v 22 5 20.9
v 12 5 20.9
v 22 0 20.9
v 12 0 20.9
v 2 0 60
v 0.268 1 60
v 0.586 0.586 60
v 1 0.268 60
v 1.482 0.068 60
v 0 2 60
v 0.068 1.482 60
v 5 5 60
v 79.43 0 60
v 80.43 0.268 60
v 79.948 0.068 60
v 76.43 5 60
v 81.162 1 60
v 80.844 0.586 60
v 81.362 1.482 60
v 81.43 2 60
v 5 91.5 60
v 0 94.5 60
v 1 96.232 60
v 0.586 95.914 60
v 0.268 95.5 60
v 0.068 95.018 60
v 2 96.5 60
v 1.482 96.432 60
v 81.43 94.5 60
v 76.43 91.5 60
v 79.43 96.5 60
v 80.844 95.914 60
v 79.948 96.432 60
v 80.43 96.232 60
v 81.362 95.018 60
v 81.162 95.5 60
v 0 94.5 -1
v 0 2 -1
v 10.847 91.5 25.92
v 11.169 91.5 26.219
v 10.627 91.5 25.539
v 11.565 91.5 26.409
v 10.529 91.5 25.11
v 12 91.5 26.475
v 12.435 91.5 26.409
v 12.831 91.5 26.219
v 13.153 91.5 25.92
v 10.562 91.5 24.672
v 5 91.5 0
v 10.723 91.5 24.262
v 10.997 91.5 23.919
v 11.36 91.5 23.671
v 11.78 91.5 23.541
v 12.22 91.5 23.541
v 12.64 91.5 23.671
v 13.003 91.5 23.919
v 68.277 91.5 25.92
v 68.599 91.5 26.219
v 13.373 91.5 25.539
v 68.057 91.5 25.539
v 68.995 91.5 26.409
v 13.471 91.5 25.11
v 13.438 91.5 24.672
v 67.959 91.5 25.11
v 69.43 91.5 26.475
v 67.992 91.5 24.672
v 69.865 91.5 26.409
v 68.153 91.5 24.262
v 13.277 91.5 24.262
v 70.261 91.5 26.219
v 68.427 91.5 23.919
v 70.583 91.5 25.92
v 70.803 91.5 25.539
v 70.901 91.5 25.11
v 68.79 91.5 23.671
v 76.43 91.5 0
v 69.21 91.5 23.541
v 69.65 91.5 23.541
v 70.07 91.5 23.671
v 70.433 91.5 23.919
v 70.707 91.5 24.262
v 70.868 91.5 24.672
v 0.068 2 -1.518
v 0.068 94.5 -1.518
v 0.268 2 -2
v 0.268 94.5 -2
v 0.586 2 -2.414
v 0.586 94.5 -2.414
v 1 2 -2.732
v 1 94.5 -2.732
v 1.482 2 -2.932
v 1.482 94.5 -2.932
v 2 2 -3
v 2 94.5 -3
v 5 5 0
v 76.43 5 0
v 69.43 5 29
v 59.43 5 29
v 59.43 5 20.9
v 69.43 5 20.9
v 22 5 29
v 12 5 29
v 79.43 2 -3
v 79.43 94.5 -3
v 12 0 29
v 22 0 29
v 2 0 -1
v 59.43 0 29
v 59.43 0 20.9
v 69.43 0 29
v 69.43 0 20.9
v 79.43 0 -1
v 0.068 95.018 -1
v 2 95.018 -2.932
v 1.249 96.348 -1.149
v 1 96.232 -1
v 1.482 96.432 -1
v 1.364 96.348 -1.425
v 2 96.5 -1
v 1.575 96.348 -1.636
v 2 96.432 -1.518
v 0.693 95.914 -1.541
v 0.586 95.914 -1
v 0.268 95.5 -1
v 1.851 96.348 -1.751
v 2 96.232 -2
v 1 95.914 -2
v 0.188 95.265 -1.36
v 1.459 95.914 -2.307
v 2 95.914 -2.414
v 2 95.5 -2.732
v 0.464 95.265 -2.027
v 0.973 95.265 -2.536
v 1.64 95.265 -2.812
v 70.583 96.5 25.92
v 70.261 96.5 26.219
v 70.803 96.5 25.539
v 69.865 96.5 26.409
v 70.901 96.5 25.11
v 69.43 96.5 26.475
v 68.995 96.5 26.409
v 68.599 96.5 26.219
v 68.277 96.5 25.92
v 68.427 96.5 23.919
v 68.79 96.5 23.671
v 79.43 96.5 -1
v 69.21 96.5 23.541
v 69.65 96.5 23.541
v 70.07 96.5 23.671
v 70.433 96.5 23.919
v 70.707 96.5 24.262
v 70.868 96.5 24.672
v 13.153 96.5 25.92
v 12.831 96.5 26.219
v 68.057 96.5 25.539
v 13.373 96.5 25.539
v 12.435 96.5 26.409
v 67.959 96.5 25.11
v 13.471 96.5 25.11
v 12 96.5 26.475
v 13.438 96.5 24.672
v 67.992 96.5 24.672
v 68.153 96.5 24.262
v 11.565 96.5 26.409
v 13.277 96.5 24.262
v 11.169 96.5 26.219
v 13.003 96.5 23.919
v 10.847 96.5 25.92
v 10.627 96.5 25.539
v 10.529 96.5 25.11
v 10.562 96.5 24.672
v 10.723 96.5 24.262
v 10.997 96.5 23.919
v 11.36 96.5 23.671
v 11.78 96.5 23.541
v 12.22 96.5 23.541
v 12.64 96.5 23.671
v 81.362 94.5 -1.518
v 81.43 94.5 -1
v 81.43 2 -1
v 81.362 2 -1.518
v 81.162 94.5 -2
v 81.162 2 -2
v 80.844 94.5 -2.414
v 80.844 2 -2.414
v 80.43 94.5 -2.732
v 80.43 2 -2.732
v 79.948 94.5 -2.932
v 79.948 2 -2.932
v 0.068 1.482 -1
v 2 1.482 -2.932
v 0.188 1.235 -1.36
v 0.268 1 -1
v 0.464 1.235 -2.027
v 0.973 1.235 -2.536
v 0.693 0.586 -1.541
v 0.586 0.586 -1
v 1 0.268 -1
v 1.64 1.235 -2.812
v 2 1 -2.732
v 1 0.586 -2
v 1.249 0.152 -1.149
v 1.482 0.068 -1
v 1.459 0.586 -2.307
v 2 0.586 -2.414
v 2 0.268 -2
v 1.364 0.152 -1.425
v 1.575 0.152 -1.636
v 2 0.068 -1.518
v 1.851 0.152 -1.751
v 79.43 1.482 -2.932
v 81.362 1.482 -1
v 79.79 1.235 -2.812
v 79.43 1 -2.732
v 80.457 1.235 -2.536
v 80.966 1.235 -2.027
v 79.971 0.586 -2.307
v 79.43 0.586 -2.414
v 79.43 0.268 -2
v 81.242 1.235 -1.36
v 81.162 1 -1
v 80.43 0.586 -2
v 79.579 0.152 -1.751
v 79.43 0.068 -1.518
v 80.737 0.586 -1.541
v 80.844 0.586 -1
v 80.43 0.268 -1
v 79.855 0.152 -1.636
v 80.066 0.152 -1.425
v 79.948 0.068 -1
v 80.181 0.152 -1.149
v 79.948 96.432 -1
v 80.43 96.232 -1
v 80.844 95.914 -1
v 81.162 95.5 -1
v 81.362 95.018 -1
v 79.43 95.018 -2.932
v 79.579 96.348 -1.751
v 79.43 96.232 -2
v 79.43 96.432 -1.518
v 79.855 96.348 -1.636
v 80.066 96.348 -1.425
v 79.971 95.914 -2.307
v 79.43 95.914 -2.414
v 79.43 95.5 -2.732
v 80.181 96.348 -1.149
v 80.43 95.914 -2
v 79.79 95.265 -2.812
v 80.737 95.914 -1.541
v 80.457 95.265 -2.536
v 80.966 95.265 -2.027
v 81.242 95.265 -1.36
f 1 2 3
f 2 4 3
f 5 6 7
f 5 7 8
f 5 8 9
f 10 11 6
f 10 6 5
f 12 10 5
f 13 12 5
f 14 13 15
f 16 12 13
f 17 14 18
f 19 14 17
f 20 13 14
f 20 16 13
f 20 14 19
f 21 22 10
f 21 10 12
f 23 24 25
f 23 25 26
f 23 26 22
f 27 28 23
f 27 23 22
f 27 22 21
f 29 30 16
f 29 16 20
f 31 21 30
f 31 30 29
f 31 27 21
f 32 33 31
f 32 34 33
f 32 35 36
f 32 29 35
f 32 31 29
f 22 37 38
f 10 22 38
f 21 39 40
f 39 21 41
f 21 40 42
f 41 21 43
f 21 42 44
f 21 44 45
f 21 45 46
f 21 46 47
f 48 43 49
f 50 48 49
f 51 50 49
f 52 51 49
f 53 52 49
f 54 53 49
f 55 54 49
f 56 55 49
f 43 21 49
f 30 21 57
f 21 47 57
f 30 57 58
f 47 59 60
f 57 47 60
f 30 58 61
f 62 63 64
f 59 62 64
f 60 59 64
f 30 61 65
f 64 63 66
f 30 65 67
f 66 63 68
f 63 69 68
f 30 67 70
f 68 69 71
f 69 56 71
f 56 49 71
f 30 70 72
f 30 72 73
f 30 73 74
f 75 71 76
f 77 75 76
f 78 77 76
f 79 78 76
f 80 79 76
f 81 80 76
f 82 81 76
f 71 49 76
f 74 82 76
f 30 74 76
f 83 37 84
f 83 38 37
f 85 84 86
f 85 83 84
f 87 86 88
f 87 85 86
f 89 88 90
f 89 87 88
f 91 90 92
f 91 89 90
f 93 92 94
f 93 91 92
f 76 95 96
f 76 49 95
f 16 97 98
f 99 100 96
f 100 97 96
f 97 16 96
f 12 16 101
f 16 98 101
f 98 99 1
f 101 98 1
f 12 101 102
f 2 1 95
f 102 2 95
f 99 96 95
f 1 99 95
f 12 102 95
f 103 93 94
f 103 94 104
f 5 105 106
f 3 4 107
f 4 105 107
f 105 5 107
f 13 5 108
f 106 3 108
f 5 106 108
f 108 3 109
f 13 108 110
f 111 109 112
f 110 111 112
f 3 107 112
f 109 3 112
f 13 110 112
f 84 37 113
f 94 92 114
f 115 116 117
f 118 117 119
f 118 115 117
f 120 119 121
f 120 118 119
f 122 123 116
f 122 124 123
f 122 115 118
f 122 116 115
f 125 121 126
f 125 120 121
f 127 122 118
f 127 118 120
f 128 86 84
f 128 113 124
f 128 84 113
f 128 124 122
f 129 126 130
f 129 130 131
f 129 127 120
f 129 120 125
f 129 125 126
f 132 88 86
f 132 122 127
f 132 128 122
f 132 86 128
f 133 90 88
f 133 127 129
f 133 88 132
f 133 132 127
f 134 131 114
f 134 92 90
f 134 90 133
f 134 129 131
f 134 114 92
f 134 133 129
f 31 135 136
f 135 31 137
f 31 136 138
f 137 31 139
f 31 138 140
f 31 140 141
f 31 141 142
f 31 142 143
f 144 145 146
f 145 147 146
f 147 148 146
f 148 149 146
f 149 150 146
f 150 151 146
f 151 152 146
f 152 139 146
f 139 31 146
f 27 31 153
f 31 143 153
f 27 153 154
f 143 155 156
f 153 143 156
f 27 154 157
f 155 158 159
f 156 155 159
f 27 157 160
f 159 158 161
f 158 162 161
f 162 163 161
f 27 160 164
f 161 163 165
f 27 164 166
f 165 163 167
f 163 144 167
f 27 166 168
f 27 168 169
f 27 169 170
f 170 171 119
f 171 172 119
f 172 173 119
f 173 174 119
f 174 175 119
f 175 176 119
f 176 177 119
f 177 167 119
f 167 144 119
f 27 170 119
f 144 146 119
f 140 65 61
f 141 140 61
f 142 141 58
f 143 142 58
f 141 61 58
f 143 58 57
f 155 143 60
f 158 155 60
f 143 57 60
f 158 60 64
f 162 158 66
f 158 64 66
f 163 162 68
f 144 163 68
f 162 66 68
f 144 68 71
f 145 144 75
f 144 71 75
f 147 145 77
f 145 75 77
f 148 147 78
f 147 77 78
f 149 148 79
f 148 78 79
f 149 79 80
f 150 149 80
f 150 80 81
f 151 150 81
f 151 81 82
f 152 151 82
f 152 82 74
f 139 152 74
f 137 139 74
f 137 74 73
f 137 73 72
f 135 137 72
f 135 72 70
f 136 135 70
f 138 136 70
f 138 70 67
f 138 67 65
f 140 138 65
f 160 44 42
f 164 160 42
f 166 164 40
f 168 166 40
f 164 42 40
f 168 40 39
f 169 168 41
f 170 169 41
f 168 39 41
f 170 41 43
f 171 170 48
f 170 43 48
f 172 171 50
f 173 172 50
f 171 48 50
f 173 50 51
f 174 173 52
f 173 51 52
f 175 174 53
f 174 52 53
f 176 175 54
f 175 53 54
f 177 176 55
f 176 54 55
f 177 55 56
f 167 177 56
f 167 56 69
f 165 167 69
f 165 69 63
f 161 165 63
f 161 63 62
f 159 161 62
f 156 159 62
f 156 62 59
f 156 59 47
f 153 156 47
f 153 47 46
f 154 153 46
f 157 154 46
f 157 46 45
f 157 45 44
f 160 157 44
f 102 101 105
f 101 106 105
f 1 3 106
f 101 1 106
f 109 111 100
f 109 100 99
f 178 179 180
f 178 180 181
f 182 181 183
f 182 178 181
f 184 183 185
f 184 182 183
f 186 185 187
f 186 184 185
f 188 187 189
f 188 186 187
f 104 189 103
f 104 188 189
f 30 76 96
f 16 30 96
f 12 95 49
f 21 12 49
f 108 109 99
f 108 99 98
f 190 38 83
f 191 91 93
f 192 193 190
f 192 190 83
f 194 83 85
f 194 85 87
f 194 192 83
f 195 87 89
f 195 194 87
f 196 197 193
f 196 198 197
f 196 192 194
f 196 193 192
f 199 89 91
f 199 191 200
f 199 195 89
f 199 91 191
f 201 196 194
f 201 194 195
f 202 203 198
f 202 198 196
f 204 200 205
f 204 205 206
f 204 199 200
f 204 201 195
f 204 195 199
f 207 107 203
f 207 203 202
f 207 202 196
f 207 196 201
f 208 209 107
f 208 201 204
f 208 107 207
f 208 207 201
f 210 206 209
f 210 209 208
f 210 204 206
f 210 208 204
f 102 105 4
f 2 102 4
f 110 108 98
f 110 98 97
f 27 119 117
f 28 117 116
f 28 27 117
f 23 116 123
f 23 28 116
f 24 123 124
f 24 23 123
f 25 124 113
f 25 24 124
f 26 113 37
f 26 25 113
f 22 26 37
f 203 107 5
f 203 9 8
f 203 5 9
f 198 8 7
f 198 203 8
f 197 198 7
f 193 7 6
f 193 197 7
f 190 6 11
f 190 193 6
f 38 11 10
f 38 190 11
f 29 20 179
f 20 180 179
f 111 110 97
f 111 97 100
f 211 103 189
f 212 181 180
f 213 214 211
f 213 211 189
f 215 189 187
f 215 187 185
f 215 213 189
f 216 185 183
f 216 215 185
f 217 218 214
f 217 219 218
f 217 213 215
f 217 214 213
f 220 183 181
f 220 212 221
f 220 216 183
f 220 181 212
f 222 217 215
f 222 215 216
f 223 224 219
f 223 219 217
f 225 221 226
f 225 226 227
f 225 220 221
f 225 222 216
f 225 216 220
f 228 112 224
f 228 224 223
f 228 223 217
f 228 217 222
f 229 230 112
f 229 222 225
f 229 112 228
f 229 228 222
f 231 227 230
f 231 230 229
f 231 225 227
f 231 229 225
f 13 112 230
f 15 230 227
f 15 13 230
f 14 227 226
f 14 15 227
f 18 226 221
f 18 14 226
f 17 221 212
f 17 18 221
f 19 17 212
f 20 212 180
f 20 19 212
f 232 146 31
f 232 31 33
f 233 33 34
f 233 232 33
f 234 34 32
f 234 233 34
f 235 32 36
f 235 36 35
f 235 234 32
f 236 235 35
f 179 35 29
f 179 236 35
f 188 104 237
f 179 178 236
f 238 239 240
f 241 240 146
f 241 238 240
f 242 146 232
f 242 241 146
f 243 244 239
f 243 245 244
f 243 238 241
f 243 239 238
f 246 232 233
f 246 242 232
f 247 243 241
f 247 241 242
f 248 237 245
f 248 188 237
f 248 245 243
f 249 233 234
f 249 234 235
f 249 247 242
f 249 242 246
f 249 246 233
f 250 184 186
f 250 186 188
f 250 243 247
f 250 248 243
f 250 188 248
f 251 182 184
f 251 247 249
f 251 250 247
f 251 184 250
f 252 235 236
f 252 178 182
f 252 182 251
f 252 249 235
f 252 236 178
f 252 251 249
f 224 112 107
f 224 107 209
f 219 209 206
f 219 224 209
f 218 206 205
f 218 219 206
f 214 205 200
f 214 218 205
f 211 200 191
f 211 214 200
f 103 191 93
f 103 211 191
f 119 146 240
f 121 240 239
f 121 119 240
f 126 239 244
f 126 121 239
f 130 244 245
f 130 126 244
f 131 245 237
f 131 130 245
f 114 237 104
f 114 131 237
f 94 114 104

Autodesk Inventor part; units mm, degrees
ref_plane "YZ Plane" through (0, 0, 0) normal (1, 0, 0) x (0, 1, 0)
ref_plane "XZ Plane" through (0, 0, 0) normal (0, 1, 0) x (-1, 0, 0)
ref_plane "XY Plane" through (0, 0, 0) normal (0, 0, 1) x (1, 0, 0)
sketch "Sketch1" plane through (0, 0, 0) normal (0, 0, 1) x (1, 0, 0)
  line L0 (0, 0) -> (81.43, 0)
  line L1 (81.43, 0) -> (81.43, 96.5)
  line L2 (81.43, 96.5) -> (0, 96.5)
  line L3 (0, 96.5) -> (0, 0)
  line L4 (5, 91.5) -> (76.43, 91.5)
  line L5 (76.43, 91.5) -> (76.43, 5)
  line L6 (76.43, 5) -> (5, 5)
  line L7 (5, 5) -> (5, 91.5)
  dimension "d1" = 81.43
  dimension "d2" = 96.5
  dimension "d3" = 5
  dimension "d4" = 5
  dimension "d5" = 5
  dimension "d6" = 5
extrude "Extrusion1" add sketch "Sketch1" against normal blind 3 contours L3 L2 L1 L0 | L4 L5 L6 L7
extrude "Extrusion2" add sketch "Sketch1" along normal blind 60
fillet "Fillet5" radius 2 2 edges at (0, 48.25, -3) (81.43, 48.25, -3)
fillet "Fillet6" radius 2 10 edges at (0.5858, 0, -2.4142) (0, 0, 29.5) (80.8442, 0, -2.4142) (81.43, 0, 29.5) (40.715, 0, -3) (80.8442, 96.5, -2.4142) (81.43, 96.5, 29.5) (0.5858, 96.5, -2.4142) (0, 96.5, 29.5) (40.715, 96.5, -3)
sketch "Sketch3" plane through (2, 0, 60) normal (0, -1, 0) x (1, 0, 0)
  line L0 (77.43, 0) -> (0, 0)
  line L1 (67.43, -39.1) -> (57.43, -39.1)
  line L2 (57.43, -39.1) -> (57.43, -31)
  line L3 (57.43, -31) -> (67.43, -31)
  line L4 (67.43, -31) -> (67.43, -39.1)
  line L5 (77.43, 0) -> (77.43, -61) projected
  line L6 (77.43, -61) -> (0, -61) projected
  line L7 (20, -31) -> (10, -31)
  line L8 (10, -31) -> (10, -39.1)
  line L9 (10, -39.1) -> (20, -39.1)
  line L10 (20, -39.1) -> (20, -31)
  line L11 (0, -61) -> (0, 0) projected
  point P0 (-2, -60)
  point P1 (77.43, -30)
  point P2 (76.43, -31)
  point P3 (1, -31)
  point P4 (0, -30)
  point P5 (10, -35.05)
  point P6 (73.8173, -31)
  point P7 (3.6124, -31)
  dimension "d38" = 10
  dimension "d39" = 8.1
  dimension "d40" = 10
  dimension "d41" = 21.9
  dimension "d42" = 10
  dimension "d43" = 8.1
  dimension "d44" = 21.9
  dimension "d45" = 10
extrude "Extrusion3" cut sketch "Sketch3" against normal blind 5 contours L1 L2 L3 L4 | L10 L9 L8 L7
sketch "Sketch4" plane through (2, 96.5, 60) normal (0, 1, 0) x (1, 0, 0)
  circle A0 centre (10, 35) radius 4
  line L0 (0, 61) -> (77.43, 61) projected
  line L1 (0, 0) -> (0, 61) projected
  circle A1 centre (67.43, 35) radius 4
  line L2 (77.43, 61) -> (77.43, 0) projected
  point P0 (-2, 60)
  point P1 (1, 31)
  point P2 (76.43, 31)
  point P3 (0, 30)
  point P4 (77.43, 30)
  point P5 (3.6123, 31)
  point P6 (73.8174, 31)
  dimension "d48" = 8
  dimension "d49" = 26
  dimension "d50" = 10
  dimension "d51" = 8
  dimension "d52" = 26
  dimension "d53" = 10
hole "Hole2" at (69.43, 96.5, 25) at (12, 96.5, 25) direction (0, -1, 0) diameter 2.95 depth 5 tip angle 118
equation "\"d52\" = d49"
properties part number "Component_shild_layered_TOPHAT"
